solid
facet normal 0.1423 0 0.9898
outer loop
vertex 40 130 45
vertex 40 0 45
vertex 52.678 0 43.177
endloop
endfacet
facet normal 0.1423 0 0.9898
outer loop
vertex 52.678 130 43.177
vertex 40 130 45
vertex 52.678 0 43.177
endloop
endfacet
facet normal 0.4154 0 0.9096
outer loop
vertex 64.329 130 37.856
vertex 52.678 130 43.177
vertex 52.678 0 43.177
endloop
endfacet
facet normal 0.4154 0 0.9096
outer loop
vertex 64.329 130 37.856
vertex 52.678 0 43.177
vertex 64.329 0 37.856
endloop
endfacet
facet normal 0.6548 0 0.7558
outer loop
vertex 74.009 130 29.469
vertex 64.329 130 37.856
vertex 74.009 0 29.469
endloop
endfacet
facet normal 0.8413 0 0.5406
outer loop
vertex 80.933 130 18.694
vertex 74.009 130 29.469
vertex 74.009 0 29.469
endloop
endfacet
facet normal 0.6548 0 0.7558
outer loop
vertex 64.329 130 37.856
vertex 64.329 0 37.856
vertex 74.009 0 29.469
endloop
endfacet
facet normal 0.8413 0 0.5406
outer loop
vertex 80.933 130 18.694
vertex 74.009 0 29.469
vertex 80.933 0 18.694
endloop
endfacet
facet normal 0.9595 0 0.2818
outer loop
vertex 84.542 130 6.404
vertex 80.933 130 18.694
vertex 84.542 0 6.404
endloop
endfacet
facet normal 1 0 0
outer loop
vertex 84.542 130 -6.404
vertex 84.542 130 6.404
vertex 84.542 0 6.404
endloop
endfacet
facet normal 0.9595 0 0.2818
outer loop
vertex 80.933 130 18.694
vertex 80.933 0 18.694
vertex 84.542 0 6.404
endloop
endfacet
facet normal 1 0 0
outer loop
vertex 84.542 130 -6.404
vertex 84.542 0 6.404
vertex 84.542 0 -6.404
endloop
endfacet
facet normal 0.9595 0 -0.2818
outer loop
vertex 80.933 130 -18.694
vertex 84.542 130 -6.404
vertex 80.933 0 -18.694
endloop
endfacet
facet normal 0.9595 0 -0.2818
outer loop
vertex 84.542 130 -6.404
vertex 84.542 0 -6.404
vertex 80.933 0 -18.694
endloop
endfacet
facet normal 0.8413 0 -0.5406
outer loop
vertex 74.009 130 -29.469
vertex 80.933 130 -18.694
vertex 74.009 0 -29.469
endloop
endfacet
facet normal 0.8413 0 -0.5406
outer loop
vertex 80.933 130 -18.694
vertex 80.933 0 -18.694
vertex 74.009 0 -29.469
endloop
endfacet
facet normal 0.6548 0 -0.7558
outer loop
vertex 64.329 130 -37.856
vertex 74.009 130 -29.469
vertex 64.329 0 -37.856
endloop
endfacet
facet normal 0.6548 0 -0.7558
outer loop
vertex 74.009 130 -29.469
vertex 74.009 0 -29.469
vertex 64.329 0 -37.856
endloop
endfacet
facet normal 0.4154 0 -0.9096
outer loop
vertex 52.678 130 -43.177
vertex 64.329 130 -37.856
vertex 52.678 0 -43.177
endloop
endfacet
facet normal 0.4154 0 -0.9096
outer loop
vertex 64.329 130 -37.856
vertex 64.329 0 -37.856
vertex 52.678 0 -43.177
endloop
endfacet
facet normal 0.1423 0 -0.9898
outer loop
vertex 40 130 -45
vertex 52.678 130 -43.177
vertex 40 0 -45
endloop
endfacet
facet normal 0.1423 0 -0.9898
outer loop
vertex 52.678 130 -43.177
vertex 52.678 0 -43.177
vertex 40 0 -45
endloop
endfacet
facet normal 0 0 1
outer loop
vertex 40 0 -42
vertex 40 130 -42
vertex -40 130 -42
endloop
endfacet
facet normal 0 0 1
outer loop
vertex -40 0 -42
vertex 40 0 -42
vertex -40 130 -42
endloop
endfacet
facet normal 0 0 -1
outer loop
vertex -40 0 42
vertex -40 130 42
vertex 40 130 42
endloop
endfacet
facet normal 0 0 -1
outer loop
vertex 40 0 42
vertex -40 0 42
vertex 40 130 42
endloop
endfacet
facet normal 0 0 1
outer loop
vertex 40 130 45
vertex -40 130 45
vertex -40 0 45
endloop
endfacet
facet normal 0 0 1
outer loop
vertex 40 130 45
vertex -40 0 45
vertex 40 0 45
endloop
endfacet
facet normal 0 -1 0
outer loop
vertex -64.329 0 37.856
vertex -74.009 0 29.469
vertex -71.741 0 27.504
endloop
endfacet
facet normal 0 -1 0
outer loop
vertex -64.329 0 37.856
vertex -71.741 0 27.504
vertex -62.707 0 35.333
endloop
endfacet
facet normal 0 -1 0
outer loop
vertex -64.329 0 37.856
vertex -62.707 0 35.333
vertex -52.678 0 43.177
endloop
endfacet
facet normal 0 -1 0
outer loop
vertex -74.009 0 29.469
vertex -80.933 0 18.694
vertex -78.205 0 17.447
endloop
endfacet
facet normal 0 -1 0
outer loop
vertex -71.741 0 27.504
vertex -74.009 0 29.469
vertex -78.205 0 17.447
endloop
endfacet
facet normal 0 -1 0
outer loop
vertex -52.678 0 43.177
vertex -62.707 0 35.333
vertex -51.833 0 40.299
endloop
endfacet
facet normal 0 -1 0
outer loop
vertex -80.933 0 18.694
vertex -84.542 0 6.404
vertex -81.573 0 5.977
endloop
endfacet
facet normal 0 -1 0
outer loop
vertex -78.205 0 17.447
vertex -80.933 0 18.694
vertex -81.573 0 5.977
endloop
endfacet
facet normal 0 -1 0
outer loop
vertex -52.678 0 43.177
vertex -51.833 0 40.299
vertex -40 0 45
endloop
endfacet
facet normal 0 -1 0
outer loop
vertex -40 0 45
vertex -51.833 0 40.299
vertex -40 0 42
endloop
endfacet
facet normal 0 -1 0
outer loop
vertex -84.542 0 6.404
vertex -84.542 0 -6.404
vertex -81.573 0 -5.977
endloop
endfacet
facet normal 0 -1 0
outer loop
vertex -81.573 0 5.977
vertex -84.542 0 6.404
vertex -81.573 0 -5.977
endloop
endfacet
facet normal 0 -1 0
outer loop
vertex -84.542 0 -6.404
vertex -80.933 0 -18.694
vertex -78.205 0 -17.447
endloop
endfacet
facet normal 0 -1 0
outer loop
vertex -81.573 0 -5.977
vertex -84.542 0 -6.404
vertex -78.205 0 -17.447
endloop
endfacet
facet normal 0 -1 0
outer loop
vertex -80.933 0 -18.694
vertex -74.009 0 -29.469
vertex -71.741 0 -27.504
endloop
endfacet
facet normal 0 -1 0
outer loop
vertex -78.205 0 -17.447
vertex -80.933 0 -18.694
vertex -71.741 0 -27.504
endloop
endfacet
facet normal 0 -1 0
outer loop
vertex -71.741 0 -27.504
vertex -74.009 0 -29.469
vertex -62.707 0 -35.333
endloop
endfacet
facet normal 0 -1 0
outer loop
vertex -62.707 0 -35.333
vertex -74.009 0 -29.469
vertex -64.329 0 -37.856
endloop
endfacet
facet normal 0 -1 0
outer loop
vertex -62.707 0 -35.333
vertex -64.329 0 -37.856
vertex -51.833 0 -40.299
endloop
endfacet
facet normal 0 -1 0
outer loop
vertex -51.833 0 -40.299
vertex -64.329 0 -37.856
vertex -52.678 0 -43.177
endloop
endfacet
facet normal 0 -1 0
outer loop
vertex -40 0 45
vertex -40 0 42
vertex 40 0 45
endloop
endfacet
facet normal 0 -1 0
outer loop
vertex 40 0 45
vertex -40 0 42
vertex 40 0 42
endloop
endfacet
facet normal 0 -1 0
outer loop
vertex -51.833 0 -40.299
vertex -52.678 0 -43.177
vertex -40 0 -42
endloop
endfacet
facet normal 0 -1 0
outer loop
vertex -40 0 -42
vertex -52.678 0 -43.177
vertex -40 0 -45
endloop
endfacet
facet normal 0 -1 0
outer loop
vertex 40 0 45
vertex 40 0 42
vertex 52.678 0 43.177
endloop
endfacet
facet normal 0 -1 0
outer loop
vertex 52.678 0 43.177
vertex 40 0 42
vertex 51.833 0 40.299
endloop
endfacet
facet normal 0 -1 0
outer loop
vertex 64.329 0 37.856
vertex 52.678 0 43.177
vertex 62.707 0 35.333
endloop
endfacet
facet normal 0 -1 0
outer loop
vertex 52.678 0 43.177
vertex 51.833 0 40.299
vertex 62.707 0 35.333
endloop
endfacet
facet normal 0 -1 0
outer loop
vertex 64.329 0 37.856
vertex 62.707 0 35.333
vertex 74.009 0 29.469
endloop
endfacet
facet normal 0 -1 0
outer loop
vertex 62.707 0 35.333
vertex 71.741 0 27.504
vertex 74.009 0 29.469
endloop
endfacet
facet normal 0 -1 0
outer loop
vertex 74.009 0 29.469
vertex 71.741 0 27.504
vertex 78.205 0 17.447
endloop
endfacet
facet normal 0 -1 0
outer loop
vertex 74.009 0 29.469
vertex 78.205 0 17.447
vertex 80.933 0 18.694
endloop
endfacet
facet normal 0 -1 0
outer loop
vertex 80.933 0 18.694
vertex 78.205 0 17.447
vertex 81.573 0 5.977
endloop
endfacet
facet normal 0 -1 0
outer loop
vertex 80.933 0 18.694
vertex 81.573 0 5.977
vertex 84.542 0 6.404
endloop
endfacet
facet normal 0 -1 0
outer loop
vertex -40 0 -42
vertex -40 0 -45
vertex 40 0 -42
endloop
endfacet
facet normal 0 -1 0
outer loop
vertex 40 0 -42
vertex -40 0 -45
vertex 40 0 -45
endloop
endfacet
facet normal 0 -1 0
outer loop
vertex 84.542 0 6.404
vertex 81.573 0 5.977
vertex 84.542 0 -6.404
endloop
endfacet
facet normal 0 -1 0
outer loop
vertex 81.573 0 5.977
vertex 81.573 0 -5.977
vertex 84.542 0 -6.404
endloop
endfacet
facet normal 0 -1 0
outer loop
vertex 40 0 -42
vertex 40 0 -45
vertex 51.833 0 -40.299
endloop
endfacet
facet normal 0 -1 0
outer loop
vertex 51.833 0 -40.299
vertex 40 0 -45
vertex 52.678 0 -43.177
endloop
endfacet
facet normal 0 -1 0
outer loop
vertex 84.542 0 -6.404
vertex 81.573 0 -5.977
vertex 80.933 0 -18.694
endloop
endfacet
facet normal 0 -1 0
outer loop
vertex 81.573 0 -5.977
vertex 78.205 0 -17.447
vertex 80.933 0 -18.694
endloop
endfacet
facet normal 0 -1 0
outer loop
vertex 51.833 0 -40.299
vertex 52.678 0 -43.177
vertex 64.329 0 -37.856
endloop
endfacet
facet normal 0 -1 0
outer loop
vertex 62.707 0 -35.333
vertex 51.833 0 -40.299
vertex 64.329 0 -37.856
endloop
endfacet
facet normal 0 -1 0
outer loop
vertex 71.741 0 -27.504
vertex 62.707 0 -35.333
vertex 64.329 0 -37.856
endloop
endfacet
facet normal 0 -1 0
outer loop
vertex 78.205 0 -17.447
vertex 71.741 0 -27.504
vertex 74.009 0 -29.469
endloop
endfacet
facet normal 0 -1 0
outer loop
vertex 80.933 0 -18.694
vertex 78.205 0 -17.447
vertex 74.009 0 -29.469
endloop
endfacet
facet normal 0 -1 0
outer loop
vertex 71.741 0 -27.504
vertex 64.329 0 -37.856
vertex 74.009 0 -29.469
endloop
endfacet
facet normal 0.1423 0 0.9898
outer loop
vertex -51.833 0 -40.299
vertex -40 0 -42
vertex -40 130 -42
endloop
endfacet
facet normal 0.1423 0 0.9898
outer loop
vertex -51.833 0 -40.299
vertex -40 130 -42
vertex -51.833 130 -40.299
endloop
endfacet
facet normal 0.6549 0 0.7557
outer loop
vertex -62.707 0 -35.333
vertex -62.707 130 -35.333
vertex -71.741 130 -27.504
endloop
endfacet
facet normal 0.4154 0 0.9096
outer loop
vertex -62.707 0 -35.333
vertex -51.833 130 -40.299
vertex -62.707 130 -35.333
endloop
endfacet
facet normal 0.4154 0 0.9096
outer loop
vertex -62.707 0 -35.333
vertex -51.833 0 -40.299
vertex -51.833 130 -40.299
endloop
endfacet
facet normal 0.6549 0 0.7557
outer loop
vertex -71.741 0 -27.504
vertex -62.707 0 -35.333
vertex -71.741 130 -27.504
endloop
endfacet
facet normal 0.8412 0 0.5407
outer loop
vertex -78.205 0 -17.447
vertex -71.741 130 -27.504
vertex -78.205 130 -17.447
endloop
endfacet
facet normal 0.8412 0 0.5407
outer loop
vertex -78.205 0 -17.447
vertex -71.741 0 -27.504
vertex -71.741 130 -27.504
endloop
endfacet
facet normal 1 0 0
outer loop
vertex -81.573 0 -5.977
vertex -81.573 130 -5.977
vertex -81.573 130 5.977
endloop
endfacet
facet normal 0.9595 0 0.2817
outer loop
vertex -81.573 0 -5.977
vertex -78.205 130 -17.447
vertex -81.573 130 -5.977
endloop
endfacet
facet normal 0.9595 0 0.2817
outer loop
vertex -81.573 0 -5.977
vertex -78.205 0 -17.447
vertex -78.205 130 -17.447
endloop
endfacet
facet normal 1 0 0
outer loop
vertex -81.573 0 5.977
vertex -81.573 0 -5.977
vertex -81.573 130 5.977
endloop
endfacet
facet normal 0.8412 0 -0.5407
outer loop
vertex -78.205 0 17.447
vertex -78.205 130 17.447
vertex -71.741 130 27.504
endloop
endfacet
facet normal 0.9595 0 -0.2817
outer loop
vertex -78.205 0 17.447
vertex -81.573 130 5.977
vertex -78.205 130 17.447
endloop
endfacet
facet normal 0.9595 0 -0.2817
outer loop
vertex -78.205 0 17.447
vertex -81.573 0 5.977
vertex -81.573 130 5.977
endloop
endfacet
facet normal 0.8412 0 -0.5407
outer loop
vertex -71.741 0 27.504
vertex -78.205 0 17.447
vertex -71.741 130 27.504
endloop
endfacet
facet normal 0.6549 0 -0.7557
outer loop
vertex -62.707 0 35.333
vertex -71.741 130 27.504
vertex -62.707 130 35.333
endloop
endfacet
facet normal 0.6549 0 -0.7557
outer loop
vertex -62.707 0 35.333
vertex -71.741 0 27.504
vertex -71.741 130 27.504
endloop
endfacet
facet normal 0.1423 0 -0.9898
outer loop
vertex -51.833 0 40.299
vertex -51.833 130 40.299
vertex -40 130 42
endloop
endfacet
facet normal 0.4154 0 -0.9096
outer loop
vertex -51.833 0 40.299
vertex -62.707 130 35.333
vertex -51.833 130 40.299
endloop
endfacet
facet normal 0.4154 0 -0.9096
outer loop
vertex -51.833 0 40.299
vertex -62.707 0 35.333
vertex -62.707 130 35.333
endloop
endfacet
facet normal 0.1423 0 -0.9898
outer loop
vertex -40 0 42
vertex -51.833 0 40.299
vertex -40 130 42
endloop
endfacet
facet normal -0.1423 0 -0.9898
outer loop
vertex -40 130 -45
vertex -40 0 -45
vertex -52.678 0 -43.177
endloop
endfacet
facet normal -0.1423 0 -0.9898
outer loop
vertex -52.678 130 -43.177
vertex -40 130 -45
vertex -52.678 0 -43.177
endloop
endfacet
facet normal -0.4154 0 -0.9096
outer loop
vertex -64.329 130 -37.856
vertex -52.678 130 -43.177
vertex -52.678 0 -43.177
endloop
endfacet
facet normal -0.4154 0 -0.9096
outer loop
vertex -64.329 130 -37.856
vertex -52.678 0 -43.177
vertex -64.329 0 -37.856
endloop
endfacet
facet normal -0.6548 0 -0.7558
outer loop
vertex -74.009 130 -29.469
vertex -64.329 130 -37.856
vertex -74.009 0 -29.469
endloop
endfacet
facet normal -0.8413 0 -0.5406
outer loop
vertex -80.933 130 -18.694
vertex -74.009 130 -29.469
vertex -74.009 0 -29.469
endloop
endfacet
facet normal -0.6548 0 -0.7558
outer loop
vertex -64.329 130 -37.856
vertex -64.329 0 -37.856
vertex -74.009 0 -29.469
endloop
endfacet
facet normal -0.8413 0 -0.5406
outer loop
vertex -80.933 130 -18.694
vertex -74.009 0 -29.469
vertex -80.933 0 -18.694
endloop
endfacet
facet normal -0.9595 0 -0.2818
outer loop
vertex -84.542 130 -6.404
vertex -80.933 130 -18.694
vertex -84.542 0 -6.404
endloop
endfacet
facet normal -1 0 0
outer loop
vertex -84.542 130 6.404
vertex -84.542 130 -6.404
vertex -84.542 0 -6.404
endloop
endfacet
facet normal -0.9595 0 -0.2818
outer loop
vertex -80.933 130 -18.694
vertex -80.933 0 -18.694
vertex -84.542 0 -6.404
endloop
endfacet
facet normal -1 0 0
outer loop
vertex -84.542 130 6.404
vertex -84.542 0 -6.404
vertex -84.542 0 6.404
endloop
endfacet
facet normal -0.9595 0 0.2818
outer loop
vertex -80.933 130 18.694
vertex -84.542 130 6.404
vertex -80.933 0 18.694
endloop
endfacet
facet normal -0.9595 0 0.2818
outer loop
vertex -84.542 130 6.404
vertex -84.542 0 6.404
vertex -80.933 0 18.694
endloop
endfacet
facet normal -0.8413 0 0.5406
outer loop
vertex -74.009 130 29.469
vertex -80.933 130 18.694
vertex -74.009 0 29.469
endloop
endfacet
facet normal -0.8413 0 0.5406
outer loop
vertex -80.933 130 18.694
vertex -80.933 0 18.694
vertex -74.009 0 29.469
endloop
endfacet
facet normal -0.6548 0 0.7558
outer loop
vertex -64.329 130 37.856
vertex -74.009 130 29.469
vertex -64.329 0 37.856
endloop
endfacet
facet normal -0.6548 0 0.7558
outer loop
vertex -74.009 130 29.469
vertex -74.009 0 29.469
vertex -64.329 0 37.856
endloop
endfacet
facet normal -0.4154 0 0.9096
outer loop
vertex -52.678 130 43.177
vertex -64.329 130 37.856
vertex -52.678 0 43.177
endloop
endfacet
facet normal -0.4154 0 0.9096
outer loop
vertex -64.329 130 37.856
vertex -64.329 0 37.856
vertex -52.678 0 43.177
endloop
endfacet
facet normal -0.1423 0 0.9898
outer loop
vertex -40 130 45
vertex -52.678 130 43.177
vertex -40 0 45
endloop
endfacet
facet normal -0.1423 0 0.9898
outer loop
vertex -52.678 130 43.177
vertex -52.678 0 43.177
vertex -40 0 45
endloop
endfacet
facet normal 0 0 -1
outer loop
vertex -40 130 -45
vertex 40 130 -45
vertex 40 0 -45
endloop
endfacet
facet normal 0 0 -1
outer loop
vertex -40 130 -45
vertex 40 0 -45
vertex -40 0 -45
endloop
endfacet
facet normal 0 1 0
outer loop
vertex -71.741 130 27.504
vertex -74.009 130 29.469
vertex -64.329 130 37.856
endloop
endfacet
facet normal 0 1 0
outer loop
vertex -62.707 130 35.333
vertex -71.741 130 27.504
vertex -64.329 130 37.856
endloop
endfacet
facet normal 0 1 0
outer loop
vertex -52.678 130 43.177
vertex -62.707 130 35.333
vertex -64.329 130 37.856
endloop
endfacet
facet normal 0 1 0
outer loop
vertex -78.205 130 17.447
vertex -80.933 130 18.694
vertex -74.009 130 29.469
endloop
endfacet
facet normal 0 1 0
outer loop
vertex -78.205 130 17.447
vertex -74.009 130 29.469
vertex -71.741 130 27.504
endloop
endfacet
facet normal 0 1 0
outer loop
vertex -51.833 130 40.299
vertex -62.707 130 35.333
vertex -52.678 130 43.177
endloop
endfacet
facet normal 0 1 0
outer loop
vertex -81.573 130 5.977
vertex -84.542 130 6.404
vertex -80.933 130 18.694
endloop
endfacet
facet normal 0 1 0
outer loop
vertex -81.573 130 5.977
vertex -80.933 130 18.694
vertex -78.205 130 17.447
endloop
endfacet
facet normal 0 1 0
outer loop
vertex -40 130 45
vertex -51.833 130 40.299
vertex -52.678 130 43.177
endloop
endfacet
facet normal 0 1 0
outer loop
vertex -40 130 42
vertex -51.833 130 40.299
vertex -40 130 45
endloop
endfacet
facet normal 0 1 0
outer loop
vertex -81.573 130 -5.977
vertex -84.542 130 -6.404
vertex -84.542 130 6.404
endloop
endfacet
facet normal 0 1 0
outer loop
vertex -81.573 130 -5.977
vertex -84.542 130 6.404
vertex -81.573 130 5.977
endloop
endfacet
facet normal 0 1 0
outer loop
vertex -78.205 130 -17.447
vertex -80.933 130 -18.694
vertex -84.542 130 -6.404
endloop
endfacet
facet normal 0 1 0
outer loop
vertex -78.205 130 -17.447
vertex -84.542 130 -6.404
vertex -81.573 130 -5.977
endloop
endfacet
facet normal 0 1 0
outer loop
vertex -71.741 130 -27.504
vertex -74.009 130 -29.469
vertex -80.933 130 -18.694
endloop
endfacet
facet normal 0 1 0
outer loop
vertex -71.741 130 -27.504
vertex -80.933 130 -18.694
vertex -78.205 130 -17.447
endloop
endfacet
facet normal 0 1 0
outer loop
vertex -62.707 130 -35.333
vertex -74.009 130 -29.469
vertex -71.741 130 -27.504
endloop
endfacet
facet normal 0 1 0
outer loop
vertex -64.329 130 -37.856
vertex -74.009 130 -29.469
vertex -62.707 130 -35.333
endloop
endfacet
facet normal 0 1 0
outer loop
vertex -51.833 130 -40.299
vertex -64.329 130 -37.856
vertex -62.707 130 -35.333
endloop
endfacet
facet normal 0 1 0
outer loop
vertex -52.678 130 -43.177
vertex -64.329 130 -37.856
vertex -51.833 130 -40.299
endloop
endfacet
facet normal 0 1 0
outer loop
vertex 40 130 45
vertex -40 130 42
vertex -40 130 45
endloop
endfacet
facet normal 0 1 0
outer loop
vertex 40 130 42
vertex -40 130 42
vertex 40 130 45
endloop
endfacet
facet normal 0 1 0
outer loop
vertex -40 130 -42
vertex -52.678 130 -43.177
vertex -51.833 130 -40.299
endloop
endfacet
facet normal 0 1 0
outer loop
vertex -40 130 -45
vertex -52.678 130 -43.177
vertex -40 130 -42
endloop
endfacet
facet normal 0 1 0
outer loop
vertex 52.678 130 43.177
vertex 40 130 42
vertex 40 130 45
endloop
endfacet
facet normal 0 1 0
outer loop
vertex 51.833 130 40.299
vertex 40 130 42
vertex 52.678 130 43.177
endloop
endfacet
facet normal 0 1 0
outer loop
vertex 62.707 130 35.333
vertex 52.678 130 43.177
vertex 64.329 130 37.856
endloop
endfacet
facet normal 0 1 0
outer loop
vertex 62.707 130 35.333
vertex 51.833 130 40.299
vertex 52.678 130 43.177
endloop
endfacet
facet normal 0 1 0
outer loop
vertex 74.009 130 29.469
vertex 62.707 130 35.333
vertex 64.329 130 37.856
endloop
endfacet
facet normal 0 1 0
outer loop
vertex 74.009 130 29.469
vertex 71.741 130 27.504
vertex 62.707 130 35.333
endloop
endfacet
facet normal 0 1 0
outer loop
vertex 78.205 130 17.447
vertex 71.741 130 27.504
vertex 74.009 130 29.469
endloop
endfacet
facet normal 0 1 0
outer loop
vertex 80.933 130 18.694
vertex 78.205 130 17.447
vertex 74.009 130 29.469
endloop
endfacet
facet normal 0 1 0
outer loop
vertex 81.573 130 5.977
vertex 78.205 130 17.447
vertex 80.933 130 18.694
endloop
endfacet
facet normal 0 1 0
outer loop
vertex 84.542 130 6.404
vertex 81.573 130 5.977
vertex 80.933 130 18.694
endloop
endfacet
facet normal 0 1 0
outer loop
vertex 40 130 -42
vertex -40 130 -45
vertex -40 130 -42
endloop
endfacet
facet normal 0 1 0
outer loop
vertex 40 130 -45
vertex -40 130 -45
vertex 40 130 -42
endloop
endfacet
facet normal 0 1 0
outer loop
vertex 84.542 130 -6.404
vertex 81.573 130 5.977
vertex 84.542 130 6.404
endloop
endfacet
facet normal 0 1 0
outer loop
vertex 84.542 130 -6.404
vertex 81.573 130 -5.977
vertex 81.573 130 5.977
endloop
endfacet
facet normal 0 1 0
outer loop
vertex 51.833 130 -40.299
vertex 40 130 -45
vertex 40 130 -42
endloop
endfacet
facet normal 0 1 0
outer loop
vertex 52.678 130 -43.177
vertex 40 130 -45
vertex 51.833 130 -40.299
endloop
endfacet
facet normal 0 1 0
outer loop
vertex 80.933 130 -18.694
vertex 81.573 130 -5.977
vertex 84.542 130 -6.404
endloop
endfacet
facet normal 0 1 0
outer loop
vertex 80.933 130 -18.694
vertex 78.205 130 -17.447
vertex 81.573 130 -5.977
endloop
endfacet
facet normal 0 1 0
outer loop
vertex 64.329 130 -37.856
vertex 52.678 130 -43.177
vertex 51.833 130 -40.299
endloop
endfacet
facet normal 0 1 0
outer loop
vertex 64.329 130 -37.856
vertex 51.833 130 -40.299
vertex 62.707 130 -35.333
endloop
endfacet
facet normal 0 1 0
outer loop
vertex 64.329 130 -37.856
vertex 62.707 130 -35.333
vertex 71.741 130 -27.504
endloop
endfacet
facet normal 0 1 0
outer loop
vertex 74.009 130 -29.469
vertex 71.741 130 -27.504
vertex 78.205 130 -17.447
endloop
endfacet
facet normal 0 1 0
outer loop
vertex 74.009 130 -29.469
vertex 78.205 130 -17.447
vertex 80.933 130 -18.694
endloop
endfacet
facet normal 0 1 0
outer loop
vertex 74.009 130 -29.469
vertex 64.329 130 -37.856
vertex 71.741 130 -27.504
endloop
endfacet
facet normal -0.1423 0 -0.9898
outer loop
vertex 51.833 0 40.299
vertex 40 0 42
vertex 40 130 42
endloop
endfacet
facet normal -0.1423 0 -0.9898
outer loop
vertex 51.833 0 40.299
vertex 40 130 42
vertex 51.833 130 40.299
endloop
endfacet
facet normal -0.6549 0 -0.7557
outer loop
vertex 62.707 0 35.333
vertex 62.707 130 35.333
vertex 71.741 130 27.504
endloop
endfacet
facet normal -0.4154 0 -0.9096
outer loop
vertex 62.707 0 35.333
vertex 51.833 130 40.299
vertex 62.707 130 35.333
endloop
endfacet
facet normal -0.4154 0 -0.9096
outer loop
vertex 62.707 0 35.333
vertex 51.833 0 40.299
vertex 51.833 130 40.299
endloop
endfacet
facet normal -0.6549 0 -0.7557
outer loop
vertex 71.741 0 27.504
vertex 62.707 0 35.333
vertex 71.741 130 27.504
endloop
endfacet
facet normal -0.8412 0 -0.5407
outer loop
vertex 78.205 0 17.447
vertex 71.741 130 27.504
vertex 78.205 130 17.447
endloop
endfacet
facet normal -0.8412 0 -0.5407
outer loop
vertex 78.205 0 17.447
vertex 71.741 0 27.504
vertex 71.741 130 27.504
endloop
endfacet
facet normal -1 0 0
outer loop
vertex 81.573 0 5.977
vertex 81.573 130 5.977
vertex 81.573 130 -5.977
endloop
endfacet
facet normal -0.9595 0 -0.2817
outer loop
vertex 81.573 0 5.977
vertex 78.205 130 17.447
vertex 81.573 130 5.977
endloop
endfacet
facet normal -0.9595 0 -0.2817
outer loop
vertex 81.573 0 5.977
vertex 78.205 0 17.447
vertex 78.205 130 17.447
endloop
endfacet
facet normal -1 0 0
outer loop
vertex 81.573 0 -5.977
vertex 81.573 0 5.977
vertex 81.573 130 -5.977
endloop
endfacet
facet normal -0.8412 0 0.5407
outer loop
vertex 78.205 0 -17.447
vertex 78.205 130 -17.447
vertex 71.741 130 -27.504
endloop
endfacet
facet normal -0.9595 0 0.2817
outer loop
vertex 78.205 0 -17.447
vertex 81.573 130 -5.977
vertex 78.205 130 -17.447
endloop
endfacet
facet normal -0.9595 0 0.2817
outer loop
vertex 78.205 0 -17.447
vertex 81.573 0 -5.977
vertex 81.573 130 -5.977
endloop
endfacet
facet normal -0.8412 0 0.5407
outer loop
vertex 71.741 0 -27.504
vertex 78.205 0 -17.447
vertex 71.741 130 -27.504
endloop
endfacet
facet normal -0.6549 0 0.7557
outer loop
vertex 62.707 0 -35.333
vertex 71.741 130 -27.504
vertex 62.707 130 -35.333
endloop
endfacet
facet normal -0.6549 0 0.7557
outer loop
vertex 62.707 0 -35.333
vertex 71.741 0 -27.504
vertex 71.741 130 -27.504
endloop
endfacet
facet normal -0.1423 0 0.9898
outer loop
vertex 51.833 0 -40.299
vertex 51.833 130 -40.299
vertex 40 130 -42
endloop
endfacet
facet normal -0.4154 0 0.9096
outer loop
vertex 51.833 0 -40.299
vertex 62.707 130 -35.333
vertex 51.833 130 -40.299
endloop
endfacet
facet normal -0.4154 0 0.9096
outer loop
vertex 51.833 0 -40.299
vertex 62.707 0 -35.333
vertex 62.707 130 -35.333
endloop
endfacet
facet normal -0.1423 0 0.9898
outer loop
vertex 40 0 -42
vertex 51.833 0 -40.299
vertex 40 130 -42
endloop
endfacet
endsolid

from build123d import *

# Parameters (mm, degrees)
BOSS_EXTRUDE1_DEPTH = 130
SHELL1_T            = -3


with BuildPart() as part:
    # Sketch1 → Boss-Extrude1 (new body)
    with BuildSketch(Plane(origin=(0, 0, 0), x_dir=(1, 0, 0), z_dir=(0, 1, 0))):
        with BuildLine():
            Line((-40, -45), (40, -45))
            ThreePointArc((40, -45), (85, 0), (40, 45))
            Line((40, 45), (-40, 45))
            ThreePointArc((-40, 45), (-85, 0), (-40, -45))
        make_face()
    extrude(amount=BOSS_EXTRUDE1_DEPTH)

    # Shell1
    shell1_openings = [part.faces().sort_by_distance(p)[0] for p in [
        (0, 130, 0),
        (0, 0, 0),
    ]]
    offset(amount=SHELL1_T, openings=shell1_openings, kind=Kind.INTERSECTION)


solid = part.part
